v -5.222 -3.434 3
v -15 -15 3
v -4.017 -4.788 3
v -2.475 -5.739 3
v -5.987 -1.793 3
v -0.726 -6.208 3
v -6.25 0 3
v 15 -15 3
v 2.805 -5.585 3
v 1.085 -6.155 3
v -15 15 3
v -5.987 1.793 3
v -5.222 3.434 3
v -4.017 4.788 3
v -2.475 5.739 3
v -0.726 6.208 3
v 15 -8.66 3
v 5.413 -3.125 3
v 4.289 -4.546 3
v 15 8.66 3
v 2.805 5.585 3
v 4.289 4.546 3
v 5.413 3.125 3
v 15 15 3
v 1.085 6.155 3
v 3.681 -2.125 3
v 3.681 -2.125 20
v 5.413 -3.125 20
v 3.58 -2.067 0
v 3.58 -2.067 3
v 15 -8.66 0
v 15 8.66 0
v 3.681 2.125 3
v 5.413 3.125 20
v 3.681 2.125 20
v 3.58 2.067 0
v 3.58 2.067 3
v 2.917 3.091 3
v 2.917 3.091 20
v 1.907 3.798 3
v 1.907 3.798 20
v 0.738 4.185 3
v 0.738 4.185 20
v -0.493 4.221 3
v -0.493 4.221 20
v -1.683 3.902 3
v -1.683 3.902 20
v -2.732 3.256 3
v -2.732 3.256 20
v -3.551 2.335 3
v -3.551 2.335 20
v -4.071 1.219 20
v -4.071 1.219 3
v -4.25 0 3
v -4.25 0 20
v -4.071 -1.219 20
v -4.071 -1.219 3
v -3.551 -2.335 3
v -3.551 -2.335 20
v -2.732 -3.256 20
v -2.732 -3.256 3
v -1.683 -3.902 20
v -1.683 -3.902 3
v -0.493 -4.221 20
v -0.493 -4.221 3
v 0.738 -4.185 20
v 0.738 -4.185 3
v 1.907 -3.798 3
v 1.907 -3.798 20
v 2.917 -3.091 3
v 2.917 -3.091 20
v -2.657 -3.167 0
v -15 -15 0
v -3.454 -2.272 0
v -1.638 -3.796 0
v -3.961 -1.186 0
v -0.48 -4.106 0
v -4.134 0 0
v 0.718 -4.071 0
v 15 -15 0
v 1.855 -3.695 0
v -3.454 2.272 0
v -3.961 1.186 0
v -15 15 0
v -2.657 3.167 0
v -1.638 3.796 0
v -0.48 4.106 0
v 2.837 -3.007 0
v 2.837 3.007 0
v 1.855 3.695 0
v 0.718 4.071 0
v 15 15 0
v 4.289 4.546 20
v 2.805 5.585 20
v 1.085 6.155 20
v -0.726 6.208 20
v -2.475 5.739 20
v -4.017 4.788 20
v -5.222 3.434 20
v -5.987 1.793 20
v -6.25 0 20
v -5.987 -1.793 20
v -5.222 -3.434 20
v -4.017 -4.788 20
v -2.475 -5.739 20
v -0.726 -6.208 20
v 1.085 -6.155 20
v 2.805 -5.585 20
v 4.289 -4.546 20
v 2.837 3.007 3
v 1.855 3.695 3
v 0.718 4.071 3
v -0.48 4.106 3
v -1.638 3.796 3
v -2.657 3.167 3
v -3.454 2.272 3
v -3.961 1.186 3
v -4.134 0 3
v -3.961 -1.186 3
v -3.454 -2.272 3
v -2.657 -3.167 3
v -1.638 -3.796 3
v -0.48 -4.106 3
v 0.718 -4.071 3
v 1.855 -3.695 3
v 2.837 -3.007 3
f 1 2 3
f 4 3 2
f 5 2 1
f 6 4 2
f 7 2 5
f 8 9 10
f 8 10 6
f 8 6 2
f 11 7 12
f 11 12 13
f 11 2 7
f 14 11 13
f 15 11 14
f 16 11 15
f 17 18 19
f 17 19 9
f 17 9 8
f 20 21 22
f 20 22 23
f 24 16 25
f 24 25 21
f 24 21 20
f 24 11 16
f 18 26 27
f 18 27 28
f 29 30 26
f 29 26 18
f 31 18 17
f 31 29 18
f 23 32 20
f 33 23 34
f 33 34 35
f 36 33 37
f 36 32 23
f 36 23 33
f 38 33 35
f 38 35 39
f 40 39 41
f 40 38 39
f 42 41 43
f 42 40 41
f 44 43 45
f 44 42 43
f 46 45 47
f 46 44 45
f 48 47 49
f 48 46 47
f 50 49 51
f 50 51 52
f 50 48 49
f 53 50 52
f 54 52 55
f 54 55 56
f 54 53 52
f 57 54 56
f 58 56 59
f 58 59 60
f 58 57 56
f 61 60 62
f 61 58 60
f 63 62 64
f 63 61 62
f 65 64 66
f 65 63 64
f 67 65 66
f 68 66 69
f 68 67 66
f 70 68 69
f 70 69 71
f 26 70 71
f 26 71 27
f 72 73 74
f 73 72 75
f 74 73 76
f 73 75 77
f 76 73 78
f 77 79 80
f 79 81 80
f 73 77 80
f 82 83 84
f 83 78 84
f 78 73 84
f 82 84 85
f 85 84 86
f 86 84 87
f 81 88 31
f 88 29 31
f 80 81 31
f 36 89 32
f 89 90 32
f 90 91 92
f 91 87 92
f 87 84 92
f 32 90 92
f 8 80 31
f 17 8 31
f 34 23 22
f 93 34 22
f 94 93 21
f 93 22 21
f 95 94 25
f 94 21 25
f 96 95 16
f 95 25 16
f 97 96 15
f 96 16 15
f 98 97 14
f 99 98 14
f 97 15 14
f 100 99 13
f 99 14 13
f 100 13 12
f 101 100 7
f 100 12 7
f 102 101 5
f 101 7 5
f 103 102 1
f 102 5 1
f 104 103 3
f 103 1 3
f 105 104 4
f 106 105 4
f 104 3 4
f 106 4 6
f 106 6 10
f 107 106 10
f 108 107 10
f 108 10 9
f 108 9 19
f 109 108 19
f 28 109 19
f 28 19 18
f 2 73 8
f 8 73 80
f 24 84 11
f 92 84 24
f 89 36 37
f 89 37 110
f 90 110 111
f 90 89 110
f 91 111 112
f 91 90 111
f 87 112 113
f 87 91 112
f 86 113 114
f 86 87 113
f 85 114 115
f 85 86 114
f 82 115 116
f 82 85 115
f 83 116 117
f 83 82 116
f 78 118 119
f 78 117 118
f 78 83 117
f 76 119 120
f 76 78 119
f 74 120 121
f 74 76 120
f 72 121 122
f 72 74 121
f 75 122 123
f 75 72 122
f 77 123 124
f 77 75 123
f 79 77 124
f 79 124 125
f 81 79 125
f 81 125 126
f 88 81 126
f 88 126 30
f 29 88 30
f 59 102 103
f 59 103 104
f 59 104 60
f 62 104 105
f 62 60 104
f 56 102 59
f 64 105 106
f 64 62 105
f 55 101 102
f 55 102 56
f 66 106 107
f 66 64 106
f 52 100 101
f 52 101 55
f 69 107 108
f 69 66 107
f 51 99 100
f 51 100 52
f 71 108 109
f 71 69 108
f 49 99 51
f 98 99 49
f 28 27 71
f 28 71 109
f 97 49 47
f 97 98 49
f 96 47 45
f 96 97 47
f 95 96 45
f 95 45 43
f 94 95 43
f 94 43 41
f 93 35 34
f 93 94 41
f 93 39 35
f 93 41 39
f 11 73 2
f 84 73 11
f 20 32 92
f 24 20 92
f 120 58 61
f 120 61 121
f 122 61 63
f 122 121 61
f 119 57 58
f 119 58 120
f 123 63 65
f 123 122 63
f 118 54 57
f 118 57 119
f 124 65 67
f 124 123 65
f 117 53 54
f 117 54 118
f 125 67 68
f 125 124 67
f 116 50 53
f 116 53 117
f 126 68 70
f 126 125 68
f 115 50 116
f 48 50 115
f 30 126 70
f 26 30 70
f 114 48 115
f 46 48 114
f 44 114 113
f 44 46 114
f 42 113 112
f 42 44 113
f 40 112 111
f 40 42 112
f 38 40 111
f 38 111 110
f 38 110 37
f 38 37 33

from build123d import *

# Parameters (mm, degrees)
F0_R     = 6.25
F0_R_2   = 4.25
F1_DEPTH = 20
F2_W     = 30
F2_H     = 30
F3_DEPTH = 3
F4_R     = 4.134278
F5_DEPTH = 20.001
F7_DEPTH = 25


with BuildPart() as f1:
    # F0 (on Top) → F1 (new body)
    with BuildSketch(Plane.XY):
        Circle(F0_R)
        Circle(F0_R_2, mode=Mode.SUBTRACT)
    extrude(amount=F1_DEPTH)

    # F2 (on Top) → F3 (join)
    with BuildSketch(Plane.XY):
        Rectangle(F2_W, F2_H)
    extrude(amount=F3_DEPTH)

    # F4 (on Top) → F5 (cut, through all)
    with BuildSketch(Plane.XY):
        Circle(F4_R)
    extrude(amount=F5_DEPTH, mode=Mode.SUBTRACT)

    # F6 (on Top) → F7 (cut)
    with BuildSketch(Plane.XY):
        Polygon((63.665008, -36.75701), (63.665008, 36.75701), (0, 0), align=None)
    extrude(amount=F7_DEPTH, mode=Mode.SUBTRACT)


solid = f1.part
